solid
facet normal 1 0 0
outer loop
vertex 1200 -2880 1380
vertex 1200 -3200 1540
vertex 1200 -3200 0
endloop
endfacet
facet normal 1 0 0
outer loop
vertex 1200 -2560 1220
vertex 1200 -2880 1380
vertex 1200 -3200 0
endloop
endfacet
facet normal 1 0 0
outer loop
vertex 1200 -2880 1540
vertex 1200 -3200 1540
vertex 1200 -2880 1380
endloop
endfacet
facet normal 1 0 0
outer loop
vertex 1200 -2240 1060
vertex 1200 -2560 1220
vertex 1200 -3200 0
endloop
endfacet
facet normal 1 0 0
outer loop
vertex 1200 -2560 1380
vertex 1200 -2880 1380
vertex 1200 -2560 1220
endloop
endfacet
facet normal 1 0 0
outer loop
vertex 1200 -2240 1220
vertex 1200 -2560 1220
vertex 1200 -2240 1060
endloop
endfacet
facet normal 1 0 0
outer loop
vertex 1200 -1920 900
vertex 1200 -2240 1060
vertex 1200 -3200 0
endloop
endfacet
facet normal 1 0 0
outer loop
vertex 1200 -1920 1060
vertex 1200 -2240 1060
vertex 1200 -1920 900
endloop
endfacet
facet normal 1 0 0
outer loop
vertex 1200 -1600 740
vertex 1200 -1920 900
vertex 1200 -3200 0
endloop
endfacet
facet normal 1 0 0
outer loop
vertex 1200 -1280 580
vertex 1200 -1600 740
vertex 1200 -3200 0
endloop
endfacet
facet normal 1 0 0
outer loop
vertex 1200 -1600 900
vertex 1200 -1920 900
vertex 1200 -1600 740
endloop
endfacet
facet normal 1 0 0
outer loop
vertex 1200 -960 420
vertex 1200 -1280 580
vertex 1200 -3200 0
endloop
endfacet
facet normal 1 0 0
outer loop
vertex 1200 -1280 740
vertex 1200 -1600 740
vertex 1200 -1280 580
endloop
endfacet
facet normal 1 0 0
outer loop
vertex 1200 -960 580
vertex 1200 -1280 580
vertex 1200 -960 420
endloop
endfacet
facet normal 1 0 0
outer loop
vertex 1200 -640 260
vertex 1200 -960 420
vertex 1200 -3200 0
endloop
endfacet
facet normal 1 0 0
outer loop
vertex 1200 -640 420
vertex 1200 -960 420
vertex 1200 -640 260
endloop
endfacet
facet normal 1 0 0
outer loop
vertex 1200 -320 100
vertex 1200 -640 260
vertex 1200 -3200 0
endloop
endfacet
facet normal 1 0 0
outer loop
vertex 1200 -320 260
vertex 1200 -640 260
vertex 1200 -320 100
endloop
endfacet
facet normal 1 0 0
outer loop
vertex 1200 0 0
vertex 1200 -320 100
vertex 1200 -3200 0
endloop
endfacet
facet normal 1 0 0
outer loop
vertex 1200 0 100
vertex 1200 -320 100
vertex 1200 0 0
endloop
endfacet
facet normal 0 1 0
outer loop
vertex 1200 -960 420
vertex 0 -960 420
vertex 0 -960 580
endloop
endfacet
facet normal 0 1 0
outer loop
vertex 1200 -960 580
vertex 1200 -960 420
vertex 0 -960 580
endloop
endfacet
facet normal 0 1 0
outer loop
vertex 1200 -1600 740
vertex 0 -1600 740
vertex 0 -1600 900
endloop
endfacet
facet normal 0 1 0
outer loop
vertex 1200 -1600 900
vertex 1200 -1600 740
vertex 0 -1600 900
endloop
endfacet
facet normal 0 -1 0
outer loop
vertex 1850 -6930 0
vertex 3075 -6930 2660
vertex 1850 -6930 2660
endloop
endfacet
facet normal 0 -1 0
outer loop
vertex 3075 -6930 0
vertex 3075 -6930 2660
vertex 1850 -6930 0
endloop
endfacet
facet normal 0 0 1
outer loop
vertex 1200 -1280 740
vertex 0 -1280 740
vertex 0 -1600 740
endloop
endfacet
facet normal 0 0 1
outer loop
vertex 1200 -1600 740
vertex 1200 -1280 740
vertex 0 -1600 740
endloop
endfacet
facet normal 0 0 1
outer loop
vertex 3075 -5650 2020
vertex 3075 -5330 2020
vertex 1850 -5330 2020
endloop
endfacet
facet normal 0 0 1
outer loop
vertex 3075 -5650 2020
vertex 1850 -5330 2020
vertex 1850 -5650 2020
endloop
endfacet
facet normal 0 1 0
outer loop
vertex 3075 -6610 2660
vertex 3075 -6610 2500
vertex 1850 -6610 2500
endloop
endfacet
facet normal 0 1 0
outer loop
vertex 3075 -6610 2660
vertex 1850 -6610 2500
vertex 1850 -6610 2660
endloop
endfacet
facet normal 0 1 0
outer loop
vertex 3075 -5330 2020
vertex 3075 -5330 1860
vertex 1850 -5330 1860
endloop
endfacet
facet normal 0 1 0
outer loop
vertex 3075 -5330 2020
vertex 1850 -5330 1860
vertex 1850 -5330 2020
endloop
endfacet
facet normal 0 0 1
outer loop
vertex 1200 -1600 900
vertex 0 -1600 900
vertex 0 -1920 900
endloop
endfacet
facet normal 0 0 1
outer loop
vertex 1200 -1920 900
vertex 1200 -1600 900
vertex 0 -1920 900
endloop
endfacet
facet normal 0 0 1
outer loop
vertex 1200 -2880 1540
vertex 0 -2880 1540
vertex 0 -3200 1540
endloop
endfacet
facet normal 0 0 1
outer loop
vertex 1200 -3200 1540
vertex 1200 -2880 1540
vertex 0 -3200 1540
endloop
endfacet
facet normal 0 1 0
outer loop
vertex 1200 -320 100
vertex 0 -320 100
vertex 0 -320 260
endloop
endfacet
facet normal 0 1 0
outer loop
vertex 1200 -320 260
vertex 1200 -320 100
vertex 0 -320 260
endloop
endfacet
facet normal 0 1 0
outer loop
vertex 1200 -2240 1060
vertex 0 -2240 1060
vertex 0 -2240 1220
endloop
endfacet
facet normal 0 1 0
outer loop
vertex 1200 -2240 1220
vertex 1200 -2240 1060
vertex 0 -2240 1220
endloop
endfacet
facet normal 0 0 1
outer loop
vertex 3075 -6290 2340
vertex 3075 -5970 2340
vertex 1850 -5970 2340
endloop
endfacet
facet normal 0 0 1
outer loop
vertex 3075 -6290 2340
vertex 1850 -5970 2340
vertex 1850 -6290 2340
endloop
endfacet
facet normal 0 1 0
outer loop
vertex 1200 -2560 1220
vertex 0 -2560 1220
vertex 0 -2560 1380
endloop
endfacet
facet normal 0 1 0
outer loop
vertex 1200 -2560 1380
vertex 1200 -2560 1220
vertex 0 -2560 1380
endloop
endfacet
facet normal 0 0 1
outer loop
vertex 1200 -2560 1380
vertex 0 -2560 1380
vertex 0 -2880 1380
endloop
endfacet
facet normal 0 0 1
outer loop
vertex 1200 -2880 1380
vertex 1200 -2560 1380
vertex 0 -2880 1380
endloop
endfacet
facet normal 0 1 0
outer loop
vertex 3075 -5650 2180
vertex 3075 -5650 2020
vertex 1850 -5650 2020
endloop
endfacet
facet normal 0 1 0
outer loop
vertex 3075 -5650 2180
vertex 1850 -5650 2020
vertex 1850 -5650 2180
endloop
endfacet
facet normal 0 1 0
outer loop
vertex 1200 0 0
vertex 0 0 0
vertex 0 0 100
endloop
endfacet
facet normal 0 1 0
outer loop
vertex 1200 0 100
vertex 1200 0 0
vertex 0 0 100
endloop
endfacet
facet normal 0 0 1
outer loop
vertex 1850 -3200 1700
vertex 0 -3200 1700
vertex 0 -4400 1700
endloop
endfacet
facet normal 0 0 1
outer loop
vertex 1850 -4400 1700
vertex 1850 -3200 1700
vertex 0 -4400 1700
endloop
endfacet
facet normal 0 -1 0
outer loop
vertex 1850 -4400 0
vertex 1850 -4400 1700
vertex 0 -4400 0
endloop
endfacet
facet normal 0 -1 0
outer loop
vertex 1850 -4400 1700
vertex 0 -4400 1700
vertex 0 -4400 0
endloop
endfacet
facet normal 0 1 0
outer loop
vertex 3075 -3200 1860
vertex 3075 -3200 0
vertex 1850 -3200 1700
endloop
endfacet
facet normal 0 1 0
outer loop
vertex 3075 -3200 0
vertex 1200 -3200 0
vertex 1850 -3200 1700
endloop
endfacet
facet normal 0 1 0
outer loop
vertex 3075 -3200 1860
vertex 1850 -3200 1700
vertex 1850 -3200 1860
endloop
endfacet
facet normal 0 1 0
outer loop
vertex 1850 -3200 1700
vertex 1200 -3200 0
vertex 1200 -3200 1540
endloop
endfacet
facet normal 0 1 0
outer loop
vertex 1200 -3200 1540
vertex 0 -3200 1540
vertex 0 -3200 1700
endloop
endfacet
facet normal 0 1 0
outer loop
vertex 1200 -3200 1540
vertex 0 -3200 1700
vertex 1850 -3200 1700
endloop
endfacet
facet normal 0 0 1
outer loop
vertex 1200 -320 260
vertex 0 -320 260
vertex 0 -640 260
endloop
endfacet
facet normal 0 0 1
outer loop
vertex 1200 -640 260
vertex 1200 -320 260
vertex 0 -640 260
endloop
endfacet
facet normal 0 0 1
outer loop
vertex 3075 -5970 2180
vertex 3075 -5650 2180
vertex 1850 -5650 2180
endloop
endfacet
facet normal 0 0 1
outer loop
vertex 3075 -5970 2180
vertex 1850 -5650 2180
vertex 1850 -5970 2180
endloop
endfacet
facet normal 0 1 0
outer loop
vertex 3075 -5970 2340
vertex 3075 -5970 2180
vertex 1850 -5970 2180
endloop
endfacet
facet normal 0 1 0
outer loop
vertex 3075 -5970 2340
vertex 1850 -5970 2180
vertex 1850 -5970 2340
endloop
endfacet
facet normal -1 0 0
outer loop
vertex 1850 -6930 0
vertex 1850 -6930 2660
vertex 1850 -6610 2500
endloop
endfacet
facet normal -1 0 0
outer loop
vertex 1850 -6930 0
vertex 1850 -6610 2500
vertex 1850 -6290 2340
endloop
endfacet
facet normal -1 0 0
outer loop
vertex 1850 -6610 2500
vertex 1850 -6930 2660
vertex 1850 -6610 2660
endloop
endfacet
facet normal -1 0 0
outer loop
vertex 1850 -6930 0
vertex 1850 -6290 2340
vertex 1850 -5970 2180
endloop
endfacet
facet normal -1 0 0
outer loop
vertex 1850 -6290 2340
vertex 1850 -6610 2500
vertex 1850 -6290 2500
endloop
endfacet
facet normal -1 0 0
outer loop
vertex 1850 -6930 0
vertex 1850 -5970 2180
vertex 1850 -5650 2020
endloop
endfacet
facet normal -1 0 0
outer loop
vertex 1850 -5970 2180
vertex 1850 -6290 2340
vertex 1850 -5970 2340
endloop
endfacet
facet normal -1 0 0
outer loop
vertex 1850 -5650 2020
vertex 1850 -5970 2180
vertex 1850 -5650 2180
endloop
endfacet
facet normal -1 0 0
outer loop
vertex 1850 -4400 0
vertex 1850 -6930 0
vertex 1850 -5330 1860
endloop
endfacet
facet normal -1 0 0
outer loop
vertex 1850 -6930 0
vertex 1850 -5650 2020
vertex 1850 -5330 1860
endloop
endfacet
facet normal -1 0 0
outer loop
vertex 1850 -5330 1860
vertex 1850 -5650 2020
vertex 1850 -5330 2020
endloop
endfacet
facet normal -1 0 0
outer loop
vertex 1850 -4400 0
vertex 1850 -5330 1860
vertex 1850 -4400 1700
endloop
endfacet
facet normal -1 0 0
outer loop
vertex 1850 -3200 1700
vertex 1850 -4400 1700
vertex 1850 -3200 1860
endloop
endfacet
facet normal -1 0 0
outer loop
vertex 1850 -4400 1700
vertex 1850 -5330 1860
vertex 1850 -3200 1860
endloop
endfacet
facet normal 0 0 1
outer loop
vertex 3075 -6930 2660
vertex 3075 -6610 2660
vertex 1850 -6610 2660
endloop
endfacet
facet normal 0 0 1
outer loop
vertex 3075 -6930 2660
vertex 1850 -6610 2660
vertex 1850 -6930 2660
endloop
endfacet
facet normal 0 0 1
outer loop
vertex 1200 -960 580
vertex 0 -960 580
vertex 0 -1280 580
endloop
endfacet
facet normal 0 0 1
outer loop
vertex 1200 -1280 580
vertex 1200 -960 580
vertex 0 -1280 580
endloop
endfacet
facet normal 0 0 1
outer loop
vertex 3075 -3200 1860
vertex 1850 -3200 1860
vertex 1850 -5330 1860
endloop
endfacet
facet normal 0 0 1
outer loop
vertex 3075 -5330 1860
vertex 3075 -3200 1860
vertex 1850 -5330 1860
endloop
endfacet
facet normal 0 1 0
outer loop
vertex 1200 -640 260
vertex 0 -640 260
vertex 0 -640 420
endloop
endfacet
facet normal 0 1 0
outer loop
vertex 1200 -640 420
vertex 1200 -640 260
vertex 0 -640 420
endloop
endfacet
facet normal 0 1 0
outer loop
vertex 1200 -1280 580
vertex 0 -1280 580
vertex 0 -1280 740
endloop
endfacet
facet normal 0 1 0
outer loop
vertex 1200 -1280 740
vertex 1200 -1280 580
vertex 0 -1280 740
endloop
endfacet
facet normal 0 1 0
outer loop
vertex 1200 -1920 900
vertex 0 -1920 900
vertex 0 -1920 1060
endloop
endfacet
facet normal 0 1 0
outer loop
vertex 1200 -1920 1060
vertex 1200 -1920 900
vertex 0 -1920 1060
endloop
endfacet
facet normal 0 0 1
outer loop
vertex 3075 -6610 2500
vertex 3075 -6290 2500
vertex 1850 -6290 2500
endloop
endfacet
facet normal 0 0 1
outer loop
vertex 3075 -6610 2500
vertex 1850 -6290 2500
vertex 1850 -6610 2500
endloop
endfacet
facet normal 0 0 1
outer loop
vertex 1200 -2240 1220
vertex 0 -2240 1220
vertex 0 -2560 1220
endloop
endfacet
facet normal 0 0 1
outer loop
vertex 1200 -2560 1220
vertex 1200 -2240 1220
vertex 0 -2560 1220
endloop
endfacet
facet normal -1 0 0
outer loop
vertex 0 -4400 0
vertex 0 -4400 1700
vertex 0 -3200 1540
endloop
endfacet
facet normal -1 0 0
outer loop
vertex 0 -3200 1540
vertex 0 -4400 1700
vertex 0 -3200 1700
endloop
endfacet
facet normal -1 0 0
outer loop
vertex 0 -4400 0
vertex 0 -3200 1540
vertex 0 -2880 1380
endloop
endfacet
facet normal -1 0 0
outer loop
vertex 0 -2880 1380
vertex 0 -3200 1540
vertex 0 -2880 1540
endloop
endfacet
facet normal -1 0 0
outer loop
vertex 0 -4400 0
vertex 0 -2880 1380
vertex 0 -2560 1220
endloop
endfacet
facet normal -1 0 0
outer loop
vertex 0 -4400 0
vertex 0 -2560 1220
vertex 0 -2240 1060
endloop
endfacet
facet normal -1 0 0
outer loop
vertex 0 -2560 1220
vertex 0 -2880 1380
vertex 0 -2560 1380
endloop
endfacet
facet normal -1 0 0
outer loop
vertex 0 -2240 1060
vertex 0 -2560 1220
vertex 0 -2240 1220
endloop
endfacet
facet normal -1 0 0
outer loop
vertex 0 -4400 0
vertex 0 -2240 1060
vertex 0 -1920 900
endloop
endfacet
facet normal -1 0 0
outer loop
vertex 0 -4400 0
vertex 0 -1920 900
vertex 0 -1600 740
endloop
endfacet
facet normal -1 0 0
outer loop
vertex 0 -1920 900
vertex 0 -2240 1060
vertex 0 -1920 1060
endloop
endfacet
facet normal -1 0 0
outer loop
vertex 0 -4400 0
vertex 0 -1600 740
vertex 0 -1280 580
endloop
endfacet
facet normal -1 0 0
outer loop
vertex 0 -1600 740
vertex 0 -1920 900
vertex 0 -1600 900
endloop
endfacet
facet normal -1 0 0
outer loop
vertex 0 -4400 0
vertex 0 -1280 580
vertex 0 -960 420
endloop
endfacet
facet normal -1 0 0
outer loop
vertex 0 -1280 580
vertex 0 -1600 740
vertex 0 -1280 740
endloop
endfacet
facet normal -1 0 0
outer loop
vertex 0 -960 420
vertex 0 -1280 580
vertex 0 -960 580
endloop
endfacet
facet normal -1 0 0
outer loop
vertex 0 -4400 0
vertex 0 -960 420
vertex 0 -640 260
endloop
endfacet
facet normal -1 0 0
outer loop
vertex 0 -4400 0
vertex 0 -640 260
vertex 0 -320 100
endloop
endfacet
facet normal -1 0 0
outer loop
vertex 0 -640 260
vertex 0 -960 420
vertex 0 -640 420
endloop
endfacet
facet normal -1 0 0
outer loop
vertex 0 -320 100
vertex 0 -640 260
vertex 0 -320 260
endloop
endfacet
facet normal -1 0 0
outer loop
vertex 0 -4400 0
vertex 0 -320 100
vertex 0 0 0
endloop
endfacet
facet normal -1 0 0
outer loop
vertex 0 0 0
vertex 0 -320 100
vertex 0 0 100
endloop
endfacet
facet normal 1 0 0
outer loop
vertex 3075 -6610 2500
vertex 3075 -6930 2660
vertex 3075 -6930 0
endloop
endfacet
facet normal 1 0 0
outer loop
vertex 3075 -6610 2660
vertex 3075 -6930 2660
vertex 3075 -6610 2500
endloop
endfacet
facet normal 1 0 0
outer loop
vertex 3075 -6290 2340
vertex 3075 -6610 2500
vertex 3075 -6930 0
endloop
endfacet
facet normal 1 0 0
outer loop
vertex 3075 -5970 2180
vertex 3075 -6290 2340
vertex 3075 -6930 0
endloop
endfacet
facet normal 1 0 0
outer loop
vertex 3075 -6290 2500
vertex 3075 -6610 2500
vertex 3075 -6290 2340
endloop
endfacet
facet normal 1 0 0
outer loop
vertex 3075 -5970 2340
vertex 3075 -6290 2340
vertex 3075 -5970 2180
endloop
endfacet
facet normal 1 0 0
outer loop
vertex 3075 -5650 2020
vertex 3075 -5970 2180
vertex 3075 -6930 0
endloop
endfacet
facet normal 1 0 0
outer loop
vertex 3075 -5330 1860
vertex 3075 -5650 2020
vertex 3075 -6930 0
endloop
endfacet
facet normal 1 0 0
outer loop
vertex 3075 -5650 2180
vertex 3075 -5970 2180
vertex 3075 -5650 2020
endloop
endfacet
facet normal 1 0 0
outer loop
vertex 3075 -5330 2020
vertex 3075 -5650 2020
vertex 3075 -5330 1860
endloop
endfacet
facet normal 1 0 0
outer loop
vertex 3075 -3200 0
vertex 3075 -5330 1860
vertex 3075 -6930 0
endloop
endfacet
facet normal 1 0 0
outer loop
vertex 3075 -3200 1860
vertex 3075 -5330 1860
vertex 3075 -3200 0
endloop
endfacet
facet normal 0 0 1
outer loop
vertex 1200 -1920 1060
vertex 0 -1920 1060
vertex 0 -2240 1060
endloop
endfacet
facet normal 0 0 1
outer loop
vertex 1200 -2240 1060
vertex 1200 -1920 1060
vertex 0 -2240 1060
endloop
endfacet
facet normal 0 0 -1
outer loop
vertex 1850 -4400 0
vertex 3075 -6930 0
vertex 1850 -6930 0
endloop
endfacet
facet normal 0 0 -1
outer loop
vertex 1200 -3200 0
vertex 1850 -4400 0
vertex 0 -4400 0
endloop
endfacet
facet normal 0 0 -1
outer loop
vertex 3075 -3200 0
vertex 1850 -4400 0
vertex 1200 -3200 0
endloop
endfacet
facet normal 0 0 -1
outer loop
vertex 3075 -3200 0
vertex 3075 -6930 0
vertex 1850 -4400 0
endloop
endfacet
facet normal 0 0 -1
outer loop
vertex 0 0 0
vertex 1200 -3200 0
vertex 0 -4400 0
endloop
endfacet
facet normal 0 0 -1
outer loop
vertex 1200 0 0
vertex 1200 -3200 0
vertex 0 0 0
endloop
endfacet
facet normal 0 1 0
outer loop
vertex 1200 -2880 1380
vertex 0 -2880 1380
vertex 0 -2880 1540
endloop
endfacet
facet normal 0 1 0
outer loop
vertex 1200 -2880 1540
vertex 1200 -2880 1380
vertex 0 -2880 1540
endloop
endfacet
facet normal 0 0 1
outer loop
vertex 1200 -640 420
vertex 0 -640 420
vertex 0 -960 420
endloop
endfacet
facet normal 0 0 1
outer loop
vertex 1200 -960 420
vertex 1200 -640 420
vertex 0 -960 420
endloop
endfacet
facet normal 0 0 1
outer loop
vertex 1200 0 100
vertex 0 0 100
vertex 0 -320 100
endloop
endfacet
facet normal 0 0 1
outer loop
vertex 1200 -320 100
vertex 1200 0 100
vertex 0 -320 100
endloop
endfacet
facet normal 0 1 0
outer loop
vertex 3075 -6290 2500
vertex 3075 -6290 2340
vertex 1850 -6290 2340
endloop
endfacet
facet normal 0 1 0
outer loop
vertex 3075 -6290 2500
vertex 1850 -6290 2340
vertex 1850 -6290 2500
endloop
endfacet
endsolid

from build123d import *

# Parameters (mm, degrees)
F1_DEPTH = 1200
F3_DEPTH = 650
F4_W     = 1200
F4_H     = 1700
F5_DEPTH = 1225
F7_DEPTH = 1225


with BuildPart() as f1:
    # F0 (on Right) → F1 (new body)
    with BuildSketch(Plane.YZ):
        Polygon((-4400, 0), (0, 0), (0, 100), (-320, 100), (-320, 260), (-640, 260), (-640, 420), (-960, 420), (-960, 580), (-1280, 580), (-1280, 740), (-1600, 740), (-1600, 900), (-1920, 900), (-1920, 1060), (-2240, 1060), (-2240, 1220), (-2560, 1220), (-2560, 1380), (-2880, 1380), (-2880, 1540), (-3200, 1540), (-3200, 1700), (-4400, 1700), align=None)
    extrude(amount=F1_DEPTH)

    # F2 (on face) → F3 (join)
    with BuildSketch(Plane.YZ.offset(1200)):
        Polygon((-3200, 1700), (-4400, 1700), (-4400, 0), (-3200, 0), (-3200, 1540), align=None)
    extrude(amount=F3_DEPTH)

    # F4 (on face) → F5 (join)
    with BuildSketch(Plane.YZ.offset(1850)):
        Polygon((-5330, 0), (-4400, 0), (-4400, 1700), (-3200, 1700), (-3200, 1860), (-5330, 1860), align=None)
        with Locations((-3800, 850)):
            Rectangle(F4_W, F4_H)
    extrude(amount=F5_DEPTH)

    # F6 (on face) → F7 (join, through all)
    with BuildSketch(Plane.YZ.offset(3075)):
        Polygon((-6930, 0), (-5330, 0), (-5330, 1860), (-5330, 2020), (-5650, 2020), (-5650, 2180), (-5970, 2180), (-5970, 2340), (-6290, 2340), (-6290, 2500), (-6610, 2500), (-6610, 2660), (-6930, 2660), align=None)
    extrude(amount=-F7_DEPTH)


solid = f1.part
